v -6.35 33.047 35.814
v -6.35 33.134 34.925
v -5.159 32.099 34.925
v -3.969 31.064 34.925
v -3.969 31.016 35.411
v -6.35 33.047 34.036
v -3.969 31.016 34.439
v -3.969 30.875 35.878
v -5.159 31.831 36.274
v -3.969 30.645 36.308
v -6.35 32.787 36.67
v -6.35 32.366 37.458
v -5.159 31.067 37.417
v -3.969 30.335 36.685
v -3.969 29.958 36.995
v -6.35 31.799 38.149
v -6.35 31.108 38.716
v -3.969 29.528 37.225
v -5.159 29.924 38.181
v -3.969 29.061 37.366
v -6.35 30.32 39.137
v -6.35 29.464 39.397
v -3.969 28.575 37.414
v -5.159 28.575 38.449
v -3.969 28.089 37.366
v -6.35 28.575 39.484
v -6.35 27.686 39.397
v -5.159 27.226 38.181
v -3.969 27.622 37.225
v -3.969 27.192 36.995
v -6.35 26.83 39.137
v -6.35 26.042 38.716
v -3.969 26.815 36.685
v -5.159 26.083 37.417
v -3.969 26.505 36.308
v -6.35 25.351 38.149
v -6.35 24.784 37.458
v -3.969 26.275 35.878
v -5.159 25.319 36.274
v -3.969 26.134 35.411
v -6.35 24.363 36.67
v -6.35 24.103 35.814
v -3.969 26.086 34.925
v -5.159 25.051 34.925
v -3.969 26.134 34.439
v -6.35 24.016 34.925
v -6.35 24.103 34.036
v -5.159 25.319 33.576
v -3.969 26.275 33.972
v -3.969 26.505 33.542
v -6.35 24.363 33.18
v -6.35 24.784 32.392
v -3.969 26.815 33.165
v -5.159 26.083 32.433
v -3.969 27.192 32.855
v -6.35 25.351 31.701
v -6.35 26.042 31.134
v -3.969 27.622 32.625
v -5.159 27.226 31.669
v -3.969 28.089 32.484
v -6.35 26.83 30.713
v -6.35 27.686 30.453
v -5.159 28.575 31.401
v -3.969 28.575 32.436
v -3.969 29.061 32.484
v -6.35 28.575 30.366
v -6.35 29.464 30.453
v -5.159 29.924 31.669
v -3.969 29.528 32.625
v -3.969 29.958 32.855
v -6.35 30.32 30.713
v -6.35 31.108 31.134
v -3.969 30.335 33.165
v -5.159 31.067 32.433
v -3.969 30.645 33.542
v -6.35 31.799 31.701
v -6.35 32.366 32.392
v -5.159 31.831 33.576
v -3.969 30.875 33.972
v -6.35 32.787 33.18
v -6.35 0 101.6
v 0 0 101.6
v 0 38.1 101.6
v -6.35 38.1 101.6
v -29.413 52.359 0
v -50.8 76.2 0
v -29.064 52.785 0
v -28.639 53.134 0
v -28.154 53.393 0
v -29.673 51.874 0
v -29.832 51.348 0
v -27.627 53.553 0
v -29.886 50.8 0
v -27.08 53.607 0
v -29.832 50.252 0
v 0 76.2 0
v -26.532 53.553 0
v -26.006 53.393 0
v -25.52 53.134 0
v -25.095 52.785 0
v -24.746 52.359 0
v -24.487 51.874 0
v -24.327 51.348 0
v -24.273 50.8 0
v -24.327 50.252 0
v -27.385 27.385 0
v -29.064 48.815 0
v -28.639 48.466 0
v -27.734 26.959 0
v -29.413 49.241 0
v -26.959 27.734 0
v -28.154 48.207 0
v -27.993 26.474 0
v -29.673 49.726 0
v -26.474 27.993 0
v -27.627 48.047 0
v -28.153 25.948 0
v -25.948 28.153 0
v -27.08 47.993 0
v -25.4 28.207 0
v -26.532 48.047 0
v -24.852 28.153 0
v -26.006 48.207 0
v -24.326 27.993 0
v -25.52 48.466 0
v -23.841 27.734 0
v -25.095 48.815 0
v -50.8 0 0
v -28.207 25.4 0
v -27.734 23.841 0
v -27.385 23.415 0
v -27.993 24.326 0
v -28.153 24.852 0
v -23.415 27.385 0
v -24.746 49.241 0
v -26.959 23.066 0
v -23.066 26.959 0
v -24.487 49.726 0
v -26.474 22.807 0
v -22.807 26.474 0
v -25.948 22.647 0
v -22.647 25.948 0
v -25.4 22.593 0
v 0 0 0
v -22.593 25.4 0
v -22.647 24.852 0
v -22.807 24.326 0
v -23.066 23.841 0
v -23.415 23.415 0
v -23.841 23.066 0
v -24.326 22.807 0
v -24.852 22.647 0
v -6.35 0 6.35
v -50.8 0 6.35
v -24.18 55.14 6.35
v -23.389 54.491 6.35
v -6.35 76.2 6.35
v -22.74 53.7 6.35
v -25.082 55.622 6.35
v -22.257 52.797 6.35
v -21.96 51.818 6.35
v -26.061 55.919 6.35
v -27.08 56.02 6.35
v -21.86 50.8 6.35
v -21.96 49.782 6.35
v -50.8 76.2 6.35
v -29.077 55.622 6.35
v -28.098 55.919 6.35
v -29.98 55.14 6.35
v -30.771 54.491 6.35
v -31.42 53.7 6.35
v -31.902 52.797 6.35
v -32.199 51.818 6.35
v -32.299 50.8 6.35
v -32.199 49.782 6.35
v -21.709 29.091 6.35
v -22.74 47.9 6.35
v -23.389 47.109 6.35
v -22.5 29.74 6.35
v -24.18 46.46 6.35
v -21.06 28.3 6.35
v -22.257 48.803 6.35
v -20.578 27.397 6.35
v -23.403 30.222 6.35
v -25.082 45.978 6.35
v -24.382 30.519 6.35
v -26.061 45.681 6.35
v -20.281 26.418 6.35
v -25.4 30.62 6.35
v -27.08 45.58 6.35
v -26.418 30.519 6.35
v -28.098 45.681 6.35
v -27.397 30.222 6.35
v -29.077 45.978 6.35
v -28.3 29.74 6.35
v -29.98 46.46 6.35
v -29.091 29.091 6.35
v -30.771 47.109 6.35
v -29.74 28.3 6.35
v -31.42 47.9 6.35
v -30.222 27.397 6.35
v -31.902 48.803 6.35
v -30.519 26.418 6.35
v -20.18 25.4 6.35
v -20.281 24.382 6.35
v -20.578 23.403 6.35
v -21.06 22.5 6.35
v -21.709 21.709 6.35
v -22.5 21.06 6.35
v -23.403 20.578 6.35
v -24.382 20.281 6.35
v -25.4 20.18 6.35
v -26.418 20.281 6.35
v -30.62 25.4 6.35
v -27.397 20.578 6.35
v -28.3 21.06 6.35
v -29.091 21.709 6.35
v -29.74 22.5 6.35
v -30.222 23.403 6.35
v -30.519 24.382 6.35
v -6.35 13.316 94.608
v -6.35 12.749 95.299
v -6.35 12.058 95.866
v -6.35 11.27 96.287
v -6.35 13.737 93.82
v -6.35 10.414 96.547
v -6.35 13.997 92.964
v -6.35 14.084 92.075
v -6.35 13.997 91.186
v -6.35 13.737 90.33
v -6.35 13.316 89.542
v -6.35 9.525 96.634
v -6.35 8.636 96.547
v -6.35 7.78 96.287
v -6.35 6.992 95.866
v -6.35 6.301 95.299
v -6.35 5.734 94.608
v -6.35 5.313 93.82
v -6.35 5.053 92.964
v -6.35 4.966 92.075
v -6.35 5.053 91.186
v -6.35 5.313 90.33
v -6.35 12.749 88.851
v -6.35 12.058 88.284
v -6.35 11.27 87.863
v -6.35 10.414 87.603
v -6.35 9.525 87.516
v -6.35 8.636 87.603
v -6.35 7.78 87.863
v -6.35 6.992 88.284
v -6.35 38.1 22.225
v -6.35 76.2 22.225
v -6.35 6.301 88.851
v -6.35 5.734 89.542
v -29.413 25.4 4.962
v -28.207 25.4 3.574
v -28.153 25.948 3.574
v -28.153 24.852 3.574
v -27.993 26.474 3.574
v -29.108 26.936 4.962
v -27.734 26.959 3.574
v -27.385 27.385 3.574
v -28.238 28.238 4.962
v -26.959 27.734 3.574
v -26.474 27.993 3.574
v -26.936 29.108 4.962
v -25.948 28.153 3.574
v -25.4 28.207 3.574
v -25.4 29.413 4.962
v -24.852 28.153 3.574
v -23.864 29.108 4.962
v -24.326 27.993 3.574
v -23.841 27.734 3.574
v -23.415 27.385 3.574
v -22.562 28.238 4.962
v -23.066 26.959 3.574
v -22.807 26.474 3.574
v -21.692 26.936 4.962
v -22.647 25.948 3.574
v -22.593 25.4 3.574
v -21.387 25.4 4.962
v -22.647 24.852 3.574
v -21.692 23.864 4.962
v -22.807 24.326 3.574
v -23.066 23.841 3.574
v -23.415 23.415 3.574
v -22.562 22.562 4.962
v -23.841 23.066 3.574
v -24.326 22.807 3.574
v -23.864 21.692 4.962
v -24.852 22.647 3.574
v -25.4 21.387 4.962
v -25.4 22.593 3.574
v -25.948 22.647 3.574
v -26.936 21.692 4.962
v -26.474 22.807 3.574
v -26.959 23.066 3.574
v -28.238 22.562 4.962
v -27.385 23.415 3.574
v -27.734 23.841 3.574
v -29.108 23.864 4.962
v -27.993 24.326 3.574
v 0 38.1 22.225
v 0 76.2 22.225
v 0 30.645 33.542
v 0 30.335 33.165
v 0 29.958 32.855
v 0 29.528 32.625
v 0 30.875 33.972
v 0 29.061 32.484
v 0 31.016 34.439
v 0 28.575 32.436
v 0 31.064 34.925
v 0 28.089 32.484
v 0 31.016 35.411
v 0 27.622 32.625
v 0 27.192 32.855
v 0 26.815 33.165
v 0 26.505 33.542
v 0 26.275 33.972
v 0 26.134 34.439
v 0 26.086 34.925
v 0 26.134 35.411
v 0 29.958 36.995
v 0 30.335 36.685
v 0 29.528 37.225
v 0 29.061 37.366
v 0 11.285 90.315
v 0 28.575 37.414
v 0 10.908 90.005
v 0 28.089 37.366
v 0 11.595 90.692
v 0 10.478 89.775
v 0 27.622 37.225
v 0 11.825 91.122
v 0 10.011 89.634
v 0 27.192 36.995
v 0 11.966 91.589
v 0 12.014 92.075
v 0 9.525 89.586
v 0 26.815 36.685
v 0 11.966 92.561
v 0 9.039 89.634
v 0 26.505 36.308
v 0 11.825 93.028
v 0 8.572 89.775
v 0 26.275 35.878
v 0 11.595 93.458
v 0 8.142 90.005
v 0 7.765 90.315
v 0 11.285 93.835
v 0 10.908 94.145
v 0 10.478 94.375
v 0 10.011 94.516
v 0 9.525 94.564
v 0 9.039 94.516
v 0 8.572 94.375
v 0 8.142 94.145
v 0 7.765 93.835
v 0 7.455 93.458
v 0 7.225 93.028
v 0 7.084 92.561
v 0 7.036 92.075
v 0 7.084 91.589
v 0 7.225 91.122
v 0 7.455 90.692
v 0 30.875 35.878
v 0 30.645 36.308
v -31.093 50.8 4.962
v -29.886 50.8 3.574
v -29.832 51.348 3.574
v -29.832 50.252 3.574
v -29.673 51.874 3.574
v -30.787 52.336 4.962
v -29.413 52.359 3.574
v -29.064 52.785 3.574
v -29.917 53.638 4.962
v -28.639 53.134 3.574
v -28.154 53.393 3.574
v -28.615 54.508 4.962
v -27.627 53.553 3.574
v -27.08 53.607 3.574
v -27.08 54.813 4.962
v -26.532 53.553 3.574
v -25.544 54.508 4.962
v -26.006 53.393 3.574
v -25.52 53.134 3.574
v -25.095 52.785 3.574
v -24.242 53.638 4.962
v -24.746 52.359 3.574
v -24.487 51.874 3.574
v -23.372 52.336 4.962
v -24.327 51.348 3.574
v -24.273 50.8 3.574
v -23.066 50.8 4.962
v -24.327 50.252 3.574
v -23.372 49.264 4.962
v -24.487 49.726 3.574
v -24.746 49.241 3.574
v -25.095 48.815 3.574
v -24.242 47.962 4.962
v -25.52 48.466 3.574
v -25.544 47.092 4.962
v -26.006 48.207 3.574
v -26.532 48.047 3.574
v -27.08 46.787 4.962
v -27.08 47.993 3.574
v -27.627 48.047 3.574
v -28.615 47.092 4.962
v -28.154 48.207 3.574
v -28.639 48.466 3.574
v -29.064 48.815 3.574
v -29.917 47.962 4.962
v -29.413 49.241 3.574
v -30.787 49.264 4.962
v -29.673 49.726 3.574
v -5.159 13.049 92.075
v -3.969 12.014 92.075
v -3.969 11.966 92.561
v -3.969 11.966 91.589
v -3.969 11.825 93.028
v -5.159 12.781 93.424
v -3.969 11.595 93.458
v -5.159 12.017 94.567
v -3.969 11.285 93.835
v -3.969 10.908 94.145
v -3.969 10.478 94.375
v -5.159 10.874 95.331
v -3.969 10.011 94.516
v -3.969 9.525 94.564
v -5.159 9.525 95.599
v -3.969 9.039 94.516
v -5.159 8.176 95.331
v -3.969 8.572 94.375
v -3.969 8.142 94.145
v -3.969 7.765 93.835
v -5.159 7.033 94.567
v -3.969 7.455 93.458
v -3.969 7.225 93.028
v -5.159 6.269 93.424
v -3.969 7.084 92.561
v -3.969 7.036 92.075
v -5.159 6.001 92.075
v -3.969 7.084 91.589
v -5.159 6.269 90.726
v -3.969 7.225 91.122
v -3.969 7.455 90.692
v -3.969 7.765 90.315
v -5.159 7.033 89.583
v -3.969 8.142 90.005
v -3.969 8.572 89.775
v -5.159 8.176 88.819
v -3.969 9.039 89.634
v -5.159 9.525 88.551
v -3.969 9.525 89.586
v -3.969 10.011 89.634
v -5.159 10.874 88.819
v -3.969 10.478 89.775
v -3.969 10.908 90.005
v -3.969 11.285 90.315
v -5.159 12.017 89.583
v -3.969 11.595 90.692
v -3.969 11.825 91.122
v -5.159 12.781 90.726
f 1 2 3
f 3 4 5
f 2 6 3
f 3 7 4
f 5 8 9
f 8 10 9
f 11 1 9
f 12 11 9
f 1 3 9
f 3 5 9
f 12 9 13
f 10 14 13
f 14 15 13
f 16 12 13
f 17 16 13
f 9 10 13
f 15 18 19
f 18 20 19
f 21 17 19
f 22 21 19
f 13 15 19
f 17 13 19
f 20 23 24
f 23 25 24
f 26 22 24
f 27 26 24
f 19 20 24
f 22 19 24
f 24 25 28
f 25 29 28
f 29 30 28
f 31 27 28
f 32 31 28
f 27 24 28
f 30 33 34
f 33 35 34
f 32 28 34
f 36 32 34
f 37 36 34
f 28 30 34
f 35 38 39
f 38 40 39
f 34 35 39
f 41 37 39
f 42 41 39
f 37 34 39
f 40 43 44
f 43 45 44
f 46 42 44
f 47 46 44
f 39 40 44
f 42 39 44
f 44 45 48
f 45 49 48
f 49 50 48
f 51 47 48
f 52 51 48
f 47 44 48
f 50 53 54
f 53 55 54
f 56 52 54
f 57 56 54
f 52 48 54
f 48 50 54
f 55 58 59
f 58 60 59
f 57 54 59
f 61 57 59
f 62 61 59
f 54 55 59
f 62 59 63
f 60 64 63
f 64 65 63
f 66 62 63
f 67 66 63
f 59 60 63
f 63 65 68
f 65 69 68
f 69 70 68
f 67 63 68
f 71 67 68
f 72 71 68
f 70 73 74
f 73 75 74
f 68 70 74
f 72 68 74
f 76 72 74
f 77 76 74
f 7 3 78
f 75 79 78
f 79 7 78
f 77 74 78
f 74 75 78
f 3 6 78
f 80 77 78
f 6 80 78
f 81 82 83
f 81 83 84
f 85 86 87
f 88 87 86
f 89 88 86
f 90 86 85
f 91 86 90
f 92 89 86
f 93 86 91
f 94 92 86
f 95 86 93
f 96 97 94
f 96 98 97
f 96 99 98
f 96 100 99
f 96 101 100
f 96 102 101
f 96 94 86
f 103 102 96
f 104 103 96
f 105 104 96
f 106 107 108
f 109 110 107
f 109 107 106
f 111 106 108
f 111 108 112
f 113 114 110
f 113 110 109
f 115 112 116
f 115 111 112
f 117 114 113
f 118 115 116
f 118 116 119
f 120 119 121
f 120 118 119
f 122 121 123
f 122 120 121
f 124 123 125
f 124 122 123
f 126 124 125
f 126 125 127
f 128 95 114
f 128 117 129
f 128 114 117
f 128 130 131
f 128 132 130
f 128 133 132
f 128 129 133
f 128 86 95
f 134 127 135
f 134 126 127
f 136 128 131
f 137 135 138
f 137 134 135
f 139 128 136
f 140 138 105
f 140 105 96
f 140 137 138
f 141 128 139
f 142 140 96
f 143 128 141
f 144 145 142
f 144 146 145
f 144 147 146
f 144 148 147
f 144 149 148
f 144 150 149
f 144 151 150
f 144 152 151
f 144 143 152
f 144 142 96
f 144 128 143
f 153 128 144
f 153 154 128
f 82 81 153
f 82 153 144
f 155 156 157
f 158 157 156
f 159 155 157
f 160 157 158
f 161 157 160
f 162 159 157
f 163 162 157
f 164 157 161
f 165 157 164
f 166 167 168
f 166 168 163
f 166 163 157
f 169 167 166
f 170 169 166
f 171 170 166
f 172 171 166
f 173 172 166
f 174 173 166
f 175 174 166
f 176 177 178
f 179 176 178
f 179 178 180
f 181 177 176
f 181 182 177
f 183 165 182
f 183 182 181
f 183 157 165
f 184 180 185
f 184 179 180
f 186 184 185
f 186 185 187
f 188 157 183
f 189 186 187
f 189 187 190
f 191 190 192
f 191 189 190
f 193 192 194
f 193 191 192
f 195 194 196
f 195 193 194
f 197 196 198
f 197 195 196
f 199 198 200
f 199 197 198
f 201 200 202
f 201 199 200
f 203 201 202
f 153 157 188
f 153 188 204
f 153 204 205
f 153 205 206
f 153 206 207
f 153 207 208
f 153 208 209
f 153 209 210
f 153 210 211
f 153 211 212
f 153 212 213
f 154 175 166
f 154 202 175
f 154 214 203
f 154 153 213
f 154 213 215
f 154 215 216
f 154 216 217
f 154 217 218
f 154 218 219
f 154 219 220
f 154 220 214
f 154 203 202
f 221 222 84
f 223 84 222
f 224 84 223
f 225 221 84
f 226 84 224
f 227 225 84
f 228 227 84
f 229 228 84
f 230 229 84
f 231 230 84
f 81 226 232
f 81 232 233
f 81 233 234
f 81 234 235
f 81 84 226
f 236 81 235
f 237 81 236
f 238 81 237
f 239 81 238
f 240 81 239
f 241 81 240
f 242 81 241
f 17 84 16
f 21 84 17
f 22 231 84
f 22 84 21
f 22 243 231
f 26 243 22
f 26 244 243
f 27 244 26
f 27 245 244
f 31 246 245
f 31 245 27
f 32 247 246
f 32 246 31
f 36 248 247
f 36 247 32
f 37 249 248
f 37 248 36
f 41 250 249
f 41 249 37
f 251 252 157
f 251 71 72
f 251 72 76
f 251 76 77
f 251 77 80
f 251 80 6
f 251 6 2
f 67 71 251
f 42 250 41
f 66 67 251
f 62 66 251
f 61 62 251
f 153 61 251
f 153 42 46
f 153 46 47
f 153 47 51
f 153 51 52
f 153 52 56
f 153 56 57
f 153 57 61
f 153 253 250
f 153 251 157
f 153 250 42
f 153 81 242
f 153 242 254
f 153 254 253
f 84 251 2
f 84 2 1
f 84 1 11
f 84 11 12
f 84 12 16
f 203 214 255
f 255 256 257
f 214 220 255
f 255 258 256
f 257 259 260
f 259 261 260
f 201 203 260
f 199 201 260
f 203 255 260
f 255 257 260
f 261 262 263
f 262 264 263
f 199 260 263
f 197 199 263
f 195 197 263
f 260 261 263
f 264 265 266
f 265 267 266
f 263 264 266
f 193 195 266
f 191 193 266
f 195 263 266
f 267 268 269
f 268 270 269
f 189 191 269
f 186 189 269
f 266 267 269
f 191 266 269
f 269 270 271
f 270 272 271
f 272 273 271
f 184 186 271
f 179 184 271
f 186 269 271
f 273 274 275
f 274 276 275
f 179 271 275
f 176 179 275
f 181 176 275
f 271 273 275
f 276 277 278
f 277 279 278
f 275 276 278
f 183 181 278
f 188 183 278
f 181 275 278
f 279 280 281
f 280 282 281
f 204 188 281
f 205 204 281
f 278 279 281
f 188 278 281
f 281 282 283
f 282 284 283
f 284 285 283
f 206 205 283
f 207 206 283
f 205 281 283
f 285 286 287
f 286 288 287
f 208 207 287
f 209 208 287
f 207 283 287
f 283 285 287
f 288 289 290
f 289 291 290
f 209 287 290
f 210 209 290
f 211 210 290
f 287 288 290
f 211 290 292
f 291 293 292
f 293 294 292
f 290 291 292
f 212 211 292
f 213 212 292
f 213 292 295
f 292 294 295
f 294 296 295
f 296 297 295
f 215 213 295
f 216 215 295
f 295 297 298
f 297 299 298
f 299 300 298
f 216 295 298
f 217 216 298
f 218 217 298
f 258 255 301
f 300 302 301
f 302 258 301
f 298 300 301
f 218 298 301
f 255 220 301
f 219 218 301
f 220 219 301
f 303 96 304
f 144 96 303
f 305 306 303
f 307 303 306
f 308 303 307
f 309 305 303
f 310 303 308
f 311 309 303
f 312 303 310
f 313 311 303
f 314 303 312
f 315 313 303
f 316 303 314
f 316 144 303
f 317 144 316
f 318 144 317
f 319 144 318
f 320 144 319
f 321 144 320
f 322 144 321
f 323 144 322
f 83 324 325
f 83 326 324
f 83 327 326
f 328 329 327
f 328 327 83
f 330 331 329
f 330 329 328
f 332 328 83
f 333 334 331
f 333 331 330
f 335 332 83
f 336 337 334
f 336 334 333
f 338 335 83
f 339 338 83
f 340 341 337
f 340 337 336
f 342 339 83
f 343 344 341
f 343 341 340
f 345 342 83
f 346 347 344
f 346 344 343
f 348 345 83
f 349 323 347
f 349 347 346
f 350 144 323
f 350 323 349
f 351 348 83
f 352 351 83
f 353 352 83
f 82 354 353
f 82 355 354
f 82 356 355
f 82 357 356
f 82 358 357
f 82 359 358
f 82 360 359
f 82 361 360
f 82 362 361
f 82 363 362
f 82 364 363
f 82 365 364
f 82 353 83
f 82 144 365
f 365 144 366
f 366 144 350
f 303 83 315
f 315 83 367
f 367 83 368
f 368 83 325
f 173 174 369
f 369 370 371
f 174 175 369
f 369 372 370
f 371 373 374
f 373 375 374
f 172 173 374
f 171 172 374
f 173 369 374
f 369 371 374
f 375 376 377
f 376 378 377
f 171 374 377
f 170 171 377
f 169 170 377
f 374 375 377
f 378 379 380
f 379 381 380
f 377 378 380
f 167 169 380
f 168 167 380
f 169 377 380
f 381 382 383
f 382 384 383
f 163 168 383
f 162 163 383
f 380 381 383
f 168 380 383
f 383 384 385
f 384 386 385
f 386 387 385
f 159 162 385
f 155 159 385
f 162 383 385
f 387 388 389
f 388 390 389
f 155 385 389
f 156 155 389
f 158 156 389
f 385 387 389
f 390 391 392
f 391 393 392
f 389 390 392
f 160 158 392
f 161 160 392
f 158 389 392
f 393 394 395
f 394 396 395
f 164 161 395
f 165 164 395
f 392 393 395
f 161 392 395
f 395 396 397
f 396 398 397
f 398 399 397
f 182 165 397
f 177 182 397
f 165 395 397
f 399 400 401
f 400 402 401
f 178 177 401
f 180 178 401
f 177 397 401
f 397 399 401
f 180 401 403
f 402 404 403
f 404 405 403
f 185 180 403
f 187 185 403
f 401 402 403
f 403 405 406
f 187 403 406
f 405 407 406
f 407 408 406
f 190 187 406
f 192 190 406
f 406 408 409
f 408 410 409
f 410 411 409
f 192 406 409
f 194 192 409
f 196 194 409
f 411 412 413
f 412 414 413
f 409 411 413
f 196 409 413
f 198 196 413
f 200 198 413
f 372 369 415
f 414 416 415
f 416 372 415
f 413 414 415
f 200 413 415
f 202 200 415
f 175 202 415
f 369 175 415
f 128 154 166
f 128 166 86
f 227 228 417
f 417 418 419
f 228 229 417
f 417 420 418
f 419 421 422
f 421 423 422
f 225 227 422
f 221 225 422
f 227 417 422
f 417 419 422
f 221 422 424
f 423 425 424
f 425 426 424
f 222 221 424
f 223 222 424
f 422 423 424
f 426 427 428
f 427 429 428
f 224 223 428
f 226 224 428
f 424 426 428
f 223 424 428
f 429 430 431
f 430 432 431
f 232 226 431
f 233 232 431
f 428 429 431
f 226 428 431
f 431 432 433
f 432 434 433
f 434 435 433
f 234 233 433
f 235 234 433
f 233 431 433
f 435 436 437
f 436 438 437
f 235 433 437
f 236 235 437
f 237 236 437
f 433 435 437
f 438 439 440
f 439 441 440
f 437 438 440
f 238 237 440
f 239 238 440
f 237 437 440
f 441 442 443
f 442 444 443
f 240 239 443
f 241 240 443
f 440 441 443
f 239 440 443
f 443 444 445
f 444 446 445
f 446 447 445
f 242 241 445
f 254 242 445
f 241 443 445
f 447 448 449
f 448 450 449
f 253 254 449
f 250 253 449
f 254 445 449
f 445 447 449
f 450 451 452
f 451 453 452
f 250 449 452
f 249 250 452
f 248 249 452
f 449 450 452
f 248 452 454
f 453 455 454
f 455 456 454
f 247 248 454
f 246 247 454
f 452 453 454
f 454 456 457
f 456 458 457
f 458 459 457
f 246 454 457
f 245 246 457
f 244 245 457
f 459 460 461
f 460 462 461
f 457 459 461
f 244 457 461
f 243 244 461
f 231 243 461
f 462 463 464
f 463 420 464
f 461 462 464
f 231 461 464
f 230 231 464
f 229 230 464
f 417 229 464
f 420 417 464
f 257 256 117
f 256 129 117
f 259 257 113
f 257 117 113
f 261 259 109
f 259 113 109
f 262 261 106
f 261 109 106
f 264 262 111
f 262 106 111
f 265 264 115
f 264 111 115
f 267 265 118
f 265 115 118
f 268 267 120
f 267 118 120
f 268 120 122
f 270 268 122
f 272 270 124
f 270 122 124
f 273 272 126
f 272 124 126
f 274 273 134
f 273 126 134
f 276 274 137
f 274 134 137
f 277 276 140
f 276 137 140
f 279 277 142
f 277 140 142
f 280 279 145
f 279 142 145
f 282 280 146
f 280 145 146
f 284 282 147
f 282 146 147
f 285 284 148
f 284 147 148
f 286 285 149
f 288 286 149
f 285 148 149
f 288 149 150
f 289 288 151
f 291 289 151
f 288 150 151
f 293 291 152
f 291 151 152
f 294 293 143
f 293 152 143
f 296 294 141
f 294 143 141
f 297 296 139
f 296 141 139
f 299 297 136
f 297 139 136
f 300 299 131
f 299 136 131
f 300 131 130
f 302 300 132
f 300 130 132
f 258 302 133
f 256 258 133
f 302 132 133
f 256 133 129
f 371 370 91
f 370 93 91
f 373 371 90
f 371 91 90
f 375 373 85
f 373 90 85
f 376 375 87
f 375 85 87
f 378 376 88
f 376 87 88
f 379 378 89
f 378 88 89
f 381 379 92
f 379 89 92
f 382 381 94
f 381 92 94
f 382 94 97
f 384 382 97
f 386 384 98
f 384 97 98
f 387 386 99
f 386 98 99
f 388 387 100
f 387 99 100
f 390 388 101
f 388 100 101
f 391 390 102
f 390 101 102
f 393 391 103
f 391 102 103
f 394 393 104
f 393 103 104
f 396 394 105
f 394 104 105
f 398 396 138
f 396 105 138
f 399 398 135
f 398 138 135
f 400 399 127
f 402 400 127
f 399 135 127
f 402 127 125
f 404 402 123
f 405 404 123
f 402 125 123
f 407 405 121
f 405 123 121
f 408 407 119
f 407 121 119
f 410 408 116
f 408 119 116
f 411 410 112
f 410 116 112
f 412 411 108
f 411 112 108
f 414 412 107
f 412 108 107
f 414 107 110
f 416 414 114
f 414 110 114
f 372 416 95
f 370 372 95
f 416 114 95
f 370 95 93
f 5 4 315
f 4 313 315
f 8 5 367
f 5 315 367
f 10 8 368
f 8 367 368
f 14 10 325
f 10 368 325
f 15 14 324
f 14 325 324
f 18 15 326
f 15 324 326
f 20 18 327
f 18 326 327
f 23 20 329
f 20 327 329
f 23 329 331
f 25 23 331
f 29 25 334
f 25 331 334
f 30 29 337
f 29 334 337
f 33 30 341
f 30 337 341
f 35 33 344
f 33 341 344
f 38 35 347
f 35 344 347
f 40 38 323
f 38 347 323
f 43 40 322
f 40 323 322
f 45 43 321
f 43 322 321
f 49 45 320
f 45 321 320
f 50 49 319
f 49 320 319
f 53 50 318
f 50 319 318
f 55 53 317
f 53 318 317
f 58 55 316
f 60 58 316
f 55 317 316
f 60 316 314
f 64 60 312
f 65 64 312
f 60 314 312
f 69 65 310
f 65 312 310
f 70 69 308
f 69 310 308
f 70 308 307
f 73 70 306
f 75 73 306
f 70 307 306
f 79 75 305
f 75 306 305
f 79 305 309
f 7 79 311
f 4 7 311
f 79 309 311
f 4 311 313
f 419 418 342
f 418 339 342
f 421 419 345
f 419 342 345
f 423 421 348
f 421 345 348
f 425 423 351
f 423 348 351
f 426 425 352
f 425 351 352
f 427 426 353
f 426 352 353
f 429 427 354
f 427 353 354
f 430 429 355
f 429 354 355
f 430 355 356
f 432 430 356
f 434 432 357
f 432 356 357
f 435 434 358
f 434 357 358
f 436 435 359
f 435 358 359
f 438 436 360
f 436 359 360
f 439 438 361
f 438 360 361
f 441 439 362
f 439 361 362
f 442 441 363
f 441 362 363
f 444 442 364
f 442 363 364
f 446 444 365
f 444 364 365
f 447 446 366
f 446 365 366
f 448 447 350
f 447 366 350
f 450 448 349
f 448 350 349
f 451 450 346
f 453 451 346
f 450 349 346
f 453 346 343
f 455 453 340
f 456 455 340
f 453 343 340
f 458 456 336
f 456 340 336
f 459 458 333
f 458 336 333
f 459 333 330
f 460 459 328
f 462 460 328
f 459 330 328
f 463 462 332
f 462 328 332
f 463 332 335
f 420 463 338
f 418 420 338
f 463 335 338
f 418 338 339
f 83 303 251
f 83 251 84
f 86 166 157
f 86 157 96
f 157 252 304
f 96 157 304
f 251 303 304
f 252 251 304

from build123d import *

# Parameters (mm, degrees)
F1_DEPTH       = 76.2
F3_D           = 4.9784
F3_CSINK_D     = 9.1186
F3_CSINK_ANGLE = 82
F5_D           = 5.6134
F5_CSINK_D     = 10.4394
F5_CSINK_ANGLE = 82
F6_W           = 38.1
F6_H           = 79.375
F7_DEPTH       = 50.801


with BuildPart() as f1:
    # F0 (on Front) → F1 (new body)
    with BuildSketch(Plane.XZ):
        Polygon((-50.8, 0), (0, 0), (0, 101.6), (-6.35, 101.6), (-6.35, 6.35), (-50.8, 6.35), align=None)
    extrude(amount=-F1_DEPTH)

    # F3 (through all)
    with Locations(Plane(origin=(-6.35, 0, 0), x_dir=(0, -1, 0), z_dir=(-1, 0, 0))):
        with Locations((-9.525, 92.075), (-28.575, 34.925)):
            CounterSinkHole(F3_D / 2, F3_CSINK_D / 2, counter_sink_angle=F3_CSINK_ANGLE)

    # F5 (through all)
    with Locations(Plane.XY.offset(6.35)):
        with Locations((-25.4, 25.4), (-27.0796256672, 50.8)):
            CounterSinkHole(F5_D / 2, F5_CSINK_D / 2, counter_sink_angle=F5_CSINK_ANGLE)

    # F6 (on face) → F7 (cut, through all)
    with BuildSketch(Plane.YZ):
        with Locations((57.15, 61.9125)):
            Rectangle(F6_W, F6_H)
    extrude(amount=-F7_DEPTH, mode=Mode.SUBTRACT)


solid = f1.part
